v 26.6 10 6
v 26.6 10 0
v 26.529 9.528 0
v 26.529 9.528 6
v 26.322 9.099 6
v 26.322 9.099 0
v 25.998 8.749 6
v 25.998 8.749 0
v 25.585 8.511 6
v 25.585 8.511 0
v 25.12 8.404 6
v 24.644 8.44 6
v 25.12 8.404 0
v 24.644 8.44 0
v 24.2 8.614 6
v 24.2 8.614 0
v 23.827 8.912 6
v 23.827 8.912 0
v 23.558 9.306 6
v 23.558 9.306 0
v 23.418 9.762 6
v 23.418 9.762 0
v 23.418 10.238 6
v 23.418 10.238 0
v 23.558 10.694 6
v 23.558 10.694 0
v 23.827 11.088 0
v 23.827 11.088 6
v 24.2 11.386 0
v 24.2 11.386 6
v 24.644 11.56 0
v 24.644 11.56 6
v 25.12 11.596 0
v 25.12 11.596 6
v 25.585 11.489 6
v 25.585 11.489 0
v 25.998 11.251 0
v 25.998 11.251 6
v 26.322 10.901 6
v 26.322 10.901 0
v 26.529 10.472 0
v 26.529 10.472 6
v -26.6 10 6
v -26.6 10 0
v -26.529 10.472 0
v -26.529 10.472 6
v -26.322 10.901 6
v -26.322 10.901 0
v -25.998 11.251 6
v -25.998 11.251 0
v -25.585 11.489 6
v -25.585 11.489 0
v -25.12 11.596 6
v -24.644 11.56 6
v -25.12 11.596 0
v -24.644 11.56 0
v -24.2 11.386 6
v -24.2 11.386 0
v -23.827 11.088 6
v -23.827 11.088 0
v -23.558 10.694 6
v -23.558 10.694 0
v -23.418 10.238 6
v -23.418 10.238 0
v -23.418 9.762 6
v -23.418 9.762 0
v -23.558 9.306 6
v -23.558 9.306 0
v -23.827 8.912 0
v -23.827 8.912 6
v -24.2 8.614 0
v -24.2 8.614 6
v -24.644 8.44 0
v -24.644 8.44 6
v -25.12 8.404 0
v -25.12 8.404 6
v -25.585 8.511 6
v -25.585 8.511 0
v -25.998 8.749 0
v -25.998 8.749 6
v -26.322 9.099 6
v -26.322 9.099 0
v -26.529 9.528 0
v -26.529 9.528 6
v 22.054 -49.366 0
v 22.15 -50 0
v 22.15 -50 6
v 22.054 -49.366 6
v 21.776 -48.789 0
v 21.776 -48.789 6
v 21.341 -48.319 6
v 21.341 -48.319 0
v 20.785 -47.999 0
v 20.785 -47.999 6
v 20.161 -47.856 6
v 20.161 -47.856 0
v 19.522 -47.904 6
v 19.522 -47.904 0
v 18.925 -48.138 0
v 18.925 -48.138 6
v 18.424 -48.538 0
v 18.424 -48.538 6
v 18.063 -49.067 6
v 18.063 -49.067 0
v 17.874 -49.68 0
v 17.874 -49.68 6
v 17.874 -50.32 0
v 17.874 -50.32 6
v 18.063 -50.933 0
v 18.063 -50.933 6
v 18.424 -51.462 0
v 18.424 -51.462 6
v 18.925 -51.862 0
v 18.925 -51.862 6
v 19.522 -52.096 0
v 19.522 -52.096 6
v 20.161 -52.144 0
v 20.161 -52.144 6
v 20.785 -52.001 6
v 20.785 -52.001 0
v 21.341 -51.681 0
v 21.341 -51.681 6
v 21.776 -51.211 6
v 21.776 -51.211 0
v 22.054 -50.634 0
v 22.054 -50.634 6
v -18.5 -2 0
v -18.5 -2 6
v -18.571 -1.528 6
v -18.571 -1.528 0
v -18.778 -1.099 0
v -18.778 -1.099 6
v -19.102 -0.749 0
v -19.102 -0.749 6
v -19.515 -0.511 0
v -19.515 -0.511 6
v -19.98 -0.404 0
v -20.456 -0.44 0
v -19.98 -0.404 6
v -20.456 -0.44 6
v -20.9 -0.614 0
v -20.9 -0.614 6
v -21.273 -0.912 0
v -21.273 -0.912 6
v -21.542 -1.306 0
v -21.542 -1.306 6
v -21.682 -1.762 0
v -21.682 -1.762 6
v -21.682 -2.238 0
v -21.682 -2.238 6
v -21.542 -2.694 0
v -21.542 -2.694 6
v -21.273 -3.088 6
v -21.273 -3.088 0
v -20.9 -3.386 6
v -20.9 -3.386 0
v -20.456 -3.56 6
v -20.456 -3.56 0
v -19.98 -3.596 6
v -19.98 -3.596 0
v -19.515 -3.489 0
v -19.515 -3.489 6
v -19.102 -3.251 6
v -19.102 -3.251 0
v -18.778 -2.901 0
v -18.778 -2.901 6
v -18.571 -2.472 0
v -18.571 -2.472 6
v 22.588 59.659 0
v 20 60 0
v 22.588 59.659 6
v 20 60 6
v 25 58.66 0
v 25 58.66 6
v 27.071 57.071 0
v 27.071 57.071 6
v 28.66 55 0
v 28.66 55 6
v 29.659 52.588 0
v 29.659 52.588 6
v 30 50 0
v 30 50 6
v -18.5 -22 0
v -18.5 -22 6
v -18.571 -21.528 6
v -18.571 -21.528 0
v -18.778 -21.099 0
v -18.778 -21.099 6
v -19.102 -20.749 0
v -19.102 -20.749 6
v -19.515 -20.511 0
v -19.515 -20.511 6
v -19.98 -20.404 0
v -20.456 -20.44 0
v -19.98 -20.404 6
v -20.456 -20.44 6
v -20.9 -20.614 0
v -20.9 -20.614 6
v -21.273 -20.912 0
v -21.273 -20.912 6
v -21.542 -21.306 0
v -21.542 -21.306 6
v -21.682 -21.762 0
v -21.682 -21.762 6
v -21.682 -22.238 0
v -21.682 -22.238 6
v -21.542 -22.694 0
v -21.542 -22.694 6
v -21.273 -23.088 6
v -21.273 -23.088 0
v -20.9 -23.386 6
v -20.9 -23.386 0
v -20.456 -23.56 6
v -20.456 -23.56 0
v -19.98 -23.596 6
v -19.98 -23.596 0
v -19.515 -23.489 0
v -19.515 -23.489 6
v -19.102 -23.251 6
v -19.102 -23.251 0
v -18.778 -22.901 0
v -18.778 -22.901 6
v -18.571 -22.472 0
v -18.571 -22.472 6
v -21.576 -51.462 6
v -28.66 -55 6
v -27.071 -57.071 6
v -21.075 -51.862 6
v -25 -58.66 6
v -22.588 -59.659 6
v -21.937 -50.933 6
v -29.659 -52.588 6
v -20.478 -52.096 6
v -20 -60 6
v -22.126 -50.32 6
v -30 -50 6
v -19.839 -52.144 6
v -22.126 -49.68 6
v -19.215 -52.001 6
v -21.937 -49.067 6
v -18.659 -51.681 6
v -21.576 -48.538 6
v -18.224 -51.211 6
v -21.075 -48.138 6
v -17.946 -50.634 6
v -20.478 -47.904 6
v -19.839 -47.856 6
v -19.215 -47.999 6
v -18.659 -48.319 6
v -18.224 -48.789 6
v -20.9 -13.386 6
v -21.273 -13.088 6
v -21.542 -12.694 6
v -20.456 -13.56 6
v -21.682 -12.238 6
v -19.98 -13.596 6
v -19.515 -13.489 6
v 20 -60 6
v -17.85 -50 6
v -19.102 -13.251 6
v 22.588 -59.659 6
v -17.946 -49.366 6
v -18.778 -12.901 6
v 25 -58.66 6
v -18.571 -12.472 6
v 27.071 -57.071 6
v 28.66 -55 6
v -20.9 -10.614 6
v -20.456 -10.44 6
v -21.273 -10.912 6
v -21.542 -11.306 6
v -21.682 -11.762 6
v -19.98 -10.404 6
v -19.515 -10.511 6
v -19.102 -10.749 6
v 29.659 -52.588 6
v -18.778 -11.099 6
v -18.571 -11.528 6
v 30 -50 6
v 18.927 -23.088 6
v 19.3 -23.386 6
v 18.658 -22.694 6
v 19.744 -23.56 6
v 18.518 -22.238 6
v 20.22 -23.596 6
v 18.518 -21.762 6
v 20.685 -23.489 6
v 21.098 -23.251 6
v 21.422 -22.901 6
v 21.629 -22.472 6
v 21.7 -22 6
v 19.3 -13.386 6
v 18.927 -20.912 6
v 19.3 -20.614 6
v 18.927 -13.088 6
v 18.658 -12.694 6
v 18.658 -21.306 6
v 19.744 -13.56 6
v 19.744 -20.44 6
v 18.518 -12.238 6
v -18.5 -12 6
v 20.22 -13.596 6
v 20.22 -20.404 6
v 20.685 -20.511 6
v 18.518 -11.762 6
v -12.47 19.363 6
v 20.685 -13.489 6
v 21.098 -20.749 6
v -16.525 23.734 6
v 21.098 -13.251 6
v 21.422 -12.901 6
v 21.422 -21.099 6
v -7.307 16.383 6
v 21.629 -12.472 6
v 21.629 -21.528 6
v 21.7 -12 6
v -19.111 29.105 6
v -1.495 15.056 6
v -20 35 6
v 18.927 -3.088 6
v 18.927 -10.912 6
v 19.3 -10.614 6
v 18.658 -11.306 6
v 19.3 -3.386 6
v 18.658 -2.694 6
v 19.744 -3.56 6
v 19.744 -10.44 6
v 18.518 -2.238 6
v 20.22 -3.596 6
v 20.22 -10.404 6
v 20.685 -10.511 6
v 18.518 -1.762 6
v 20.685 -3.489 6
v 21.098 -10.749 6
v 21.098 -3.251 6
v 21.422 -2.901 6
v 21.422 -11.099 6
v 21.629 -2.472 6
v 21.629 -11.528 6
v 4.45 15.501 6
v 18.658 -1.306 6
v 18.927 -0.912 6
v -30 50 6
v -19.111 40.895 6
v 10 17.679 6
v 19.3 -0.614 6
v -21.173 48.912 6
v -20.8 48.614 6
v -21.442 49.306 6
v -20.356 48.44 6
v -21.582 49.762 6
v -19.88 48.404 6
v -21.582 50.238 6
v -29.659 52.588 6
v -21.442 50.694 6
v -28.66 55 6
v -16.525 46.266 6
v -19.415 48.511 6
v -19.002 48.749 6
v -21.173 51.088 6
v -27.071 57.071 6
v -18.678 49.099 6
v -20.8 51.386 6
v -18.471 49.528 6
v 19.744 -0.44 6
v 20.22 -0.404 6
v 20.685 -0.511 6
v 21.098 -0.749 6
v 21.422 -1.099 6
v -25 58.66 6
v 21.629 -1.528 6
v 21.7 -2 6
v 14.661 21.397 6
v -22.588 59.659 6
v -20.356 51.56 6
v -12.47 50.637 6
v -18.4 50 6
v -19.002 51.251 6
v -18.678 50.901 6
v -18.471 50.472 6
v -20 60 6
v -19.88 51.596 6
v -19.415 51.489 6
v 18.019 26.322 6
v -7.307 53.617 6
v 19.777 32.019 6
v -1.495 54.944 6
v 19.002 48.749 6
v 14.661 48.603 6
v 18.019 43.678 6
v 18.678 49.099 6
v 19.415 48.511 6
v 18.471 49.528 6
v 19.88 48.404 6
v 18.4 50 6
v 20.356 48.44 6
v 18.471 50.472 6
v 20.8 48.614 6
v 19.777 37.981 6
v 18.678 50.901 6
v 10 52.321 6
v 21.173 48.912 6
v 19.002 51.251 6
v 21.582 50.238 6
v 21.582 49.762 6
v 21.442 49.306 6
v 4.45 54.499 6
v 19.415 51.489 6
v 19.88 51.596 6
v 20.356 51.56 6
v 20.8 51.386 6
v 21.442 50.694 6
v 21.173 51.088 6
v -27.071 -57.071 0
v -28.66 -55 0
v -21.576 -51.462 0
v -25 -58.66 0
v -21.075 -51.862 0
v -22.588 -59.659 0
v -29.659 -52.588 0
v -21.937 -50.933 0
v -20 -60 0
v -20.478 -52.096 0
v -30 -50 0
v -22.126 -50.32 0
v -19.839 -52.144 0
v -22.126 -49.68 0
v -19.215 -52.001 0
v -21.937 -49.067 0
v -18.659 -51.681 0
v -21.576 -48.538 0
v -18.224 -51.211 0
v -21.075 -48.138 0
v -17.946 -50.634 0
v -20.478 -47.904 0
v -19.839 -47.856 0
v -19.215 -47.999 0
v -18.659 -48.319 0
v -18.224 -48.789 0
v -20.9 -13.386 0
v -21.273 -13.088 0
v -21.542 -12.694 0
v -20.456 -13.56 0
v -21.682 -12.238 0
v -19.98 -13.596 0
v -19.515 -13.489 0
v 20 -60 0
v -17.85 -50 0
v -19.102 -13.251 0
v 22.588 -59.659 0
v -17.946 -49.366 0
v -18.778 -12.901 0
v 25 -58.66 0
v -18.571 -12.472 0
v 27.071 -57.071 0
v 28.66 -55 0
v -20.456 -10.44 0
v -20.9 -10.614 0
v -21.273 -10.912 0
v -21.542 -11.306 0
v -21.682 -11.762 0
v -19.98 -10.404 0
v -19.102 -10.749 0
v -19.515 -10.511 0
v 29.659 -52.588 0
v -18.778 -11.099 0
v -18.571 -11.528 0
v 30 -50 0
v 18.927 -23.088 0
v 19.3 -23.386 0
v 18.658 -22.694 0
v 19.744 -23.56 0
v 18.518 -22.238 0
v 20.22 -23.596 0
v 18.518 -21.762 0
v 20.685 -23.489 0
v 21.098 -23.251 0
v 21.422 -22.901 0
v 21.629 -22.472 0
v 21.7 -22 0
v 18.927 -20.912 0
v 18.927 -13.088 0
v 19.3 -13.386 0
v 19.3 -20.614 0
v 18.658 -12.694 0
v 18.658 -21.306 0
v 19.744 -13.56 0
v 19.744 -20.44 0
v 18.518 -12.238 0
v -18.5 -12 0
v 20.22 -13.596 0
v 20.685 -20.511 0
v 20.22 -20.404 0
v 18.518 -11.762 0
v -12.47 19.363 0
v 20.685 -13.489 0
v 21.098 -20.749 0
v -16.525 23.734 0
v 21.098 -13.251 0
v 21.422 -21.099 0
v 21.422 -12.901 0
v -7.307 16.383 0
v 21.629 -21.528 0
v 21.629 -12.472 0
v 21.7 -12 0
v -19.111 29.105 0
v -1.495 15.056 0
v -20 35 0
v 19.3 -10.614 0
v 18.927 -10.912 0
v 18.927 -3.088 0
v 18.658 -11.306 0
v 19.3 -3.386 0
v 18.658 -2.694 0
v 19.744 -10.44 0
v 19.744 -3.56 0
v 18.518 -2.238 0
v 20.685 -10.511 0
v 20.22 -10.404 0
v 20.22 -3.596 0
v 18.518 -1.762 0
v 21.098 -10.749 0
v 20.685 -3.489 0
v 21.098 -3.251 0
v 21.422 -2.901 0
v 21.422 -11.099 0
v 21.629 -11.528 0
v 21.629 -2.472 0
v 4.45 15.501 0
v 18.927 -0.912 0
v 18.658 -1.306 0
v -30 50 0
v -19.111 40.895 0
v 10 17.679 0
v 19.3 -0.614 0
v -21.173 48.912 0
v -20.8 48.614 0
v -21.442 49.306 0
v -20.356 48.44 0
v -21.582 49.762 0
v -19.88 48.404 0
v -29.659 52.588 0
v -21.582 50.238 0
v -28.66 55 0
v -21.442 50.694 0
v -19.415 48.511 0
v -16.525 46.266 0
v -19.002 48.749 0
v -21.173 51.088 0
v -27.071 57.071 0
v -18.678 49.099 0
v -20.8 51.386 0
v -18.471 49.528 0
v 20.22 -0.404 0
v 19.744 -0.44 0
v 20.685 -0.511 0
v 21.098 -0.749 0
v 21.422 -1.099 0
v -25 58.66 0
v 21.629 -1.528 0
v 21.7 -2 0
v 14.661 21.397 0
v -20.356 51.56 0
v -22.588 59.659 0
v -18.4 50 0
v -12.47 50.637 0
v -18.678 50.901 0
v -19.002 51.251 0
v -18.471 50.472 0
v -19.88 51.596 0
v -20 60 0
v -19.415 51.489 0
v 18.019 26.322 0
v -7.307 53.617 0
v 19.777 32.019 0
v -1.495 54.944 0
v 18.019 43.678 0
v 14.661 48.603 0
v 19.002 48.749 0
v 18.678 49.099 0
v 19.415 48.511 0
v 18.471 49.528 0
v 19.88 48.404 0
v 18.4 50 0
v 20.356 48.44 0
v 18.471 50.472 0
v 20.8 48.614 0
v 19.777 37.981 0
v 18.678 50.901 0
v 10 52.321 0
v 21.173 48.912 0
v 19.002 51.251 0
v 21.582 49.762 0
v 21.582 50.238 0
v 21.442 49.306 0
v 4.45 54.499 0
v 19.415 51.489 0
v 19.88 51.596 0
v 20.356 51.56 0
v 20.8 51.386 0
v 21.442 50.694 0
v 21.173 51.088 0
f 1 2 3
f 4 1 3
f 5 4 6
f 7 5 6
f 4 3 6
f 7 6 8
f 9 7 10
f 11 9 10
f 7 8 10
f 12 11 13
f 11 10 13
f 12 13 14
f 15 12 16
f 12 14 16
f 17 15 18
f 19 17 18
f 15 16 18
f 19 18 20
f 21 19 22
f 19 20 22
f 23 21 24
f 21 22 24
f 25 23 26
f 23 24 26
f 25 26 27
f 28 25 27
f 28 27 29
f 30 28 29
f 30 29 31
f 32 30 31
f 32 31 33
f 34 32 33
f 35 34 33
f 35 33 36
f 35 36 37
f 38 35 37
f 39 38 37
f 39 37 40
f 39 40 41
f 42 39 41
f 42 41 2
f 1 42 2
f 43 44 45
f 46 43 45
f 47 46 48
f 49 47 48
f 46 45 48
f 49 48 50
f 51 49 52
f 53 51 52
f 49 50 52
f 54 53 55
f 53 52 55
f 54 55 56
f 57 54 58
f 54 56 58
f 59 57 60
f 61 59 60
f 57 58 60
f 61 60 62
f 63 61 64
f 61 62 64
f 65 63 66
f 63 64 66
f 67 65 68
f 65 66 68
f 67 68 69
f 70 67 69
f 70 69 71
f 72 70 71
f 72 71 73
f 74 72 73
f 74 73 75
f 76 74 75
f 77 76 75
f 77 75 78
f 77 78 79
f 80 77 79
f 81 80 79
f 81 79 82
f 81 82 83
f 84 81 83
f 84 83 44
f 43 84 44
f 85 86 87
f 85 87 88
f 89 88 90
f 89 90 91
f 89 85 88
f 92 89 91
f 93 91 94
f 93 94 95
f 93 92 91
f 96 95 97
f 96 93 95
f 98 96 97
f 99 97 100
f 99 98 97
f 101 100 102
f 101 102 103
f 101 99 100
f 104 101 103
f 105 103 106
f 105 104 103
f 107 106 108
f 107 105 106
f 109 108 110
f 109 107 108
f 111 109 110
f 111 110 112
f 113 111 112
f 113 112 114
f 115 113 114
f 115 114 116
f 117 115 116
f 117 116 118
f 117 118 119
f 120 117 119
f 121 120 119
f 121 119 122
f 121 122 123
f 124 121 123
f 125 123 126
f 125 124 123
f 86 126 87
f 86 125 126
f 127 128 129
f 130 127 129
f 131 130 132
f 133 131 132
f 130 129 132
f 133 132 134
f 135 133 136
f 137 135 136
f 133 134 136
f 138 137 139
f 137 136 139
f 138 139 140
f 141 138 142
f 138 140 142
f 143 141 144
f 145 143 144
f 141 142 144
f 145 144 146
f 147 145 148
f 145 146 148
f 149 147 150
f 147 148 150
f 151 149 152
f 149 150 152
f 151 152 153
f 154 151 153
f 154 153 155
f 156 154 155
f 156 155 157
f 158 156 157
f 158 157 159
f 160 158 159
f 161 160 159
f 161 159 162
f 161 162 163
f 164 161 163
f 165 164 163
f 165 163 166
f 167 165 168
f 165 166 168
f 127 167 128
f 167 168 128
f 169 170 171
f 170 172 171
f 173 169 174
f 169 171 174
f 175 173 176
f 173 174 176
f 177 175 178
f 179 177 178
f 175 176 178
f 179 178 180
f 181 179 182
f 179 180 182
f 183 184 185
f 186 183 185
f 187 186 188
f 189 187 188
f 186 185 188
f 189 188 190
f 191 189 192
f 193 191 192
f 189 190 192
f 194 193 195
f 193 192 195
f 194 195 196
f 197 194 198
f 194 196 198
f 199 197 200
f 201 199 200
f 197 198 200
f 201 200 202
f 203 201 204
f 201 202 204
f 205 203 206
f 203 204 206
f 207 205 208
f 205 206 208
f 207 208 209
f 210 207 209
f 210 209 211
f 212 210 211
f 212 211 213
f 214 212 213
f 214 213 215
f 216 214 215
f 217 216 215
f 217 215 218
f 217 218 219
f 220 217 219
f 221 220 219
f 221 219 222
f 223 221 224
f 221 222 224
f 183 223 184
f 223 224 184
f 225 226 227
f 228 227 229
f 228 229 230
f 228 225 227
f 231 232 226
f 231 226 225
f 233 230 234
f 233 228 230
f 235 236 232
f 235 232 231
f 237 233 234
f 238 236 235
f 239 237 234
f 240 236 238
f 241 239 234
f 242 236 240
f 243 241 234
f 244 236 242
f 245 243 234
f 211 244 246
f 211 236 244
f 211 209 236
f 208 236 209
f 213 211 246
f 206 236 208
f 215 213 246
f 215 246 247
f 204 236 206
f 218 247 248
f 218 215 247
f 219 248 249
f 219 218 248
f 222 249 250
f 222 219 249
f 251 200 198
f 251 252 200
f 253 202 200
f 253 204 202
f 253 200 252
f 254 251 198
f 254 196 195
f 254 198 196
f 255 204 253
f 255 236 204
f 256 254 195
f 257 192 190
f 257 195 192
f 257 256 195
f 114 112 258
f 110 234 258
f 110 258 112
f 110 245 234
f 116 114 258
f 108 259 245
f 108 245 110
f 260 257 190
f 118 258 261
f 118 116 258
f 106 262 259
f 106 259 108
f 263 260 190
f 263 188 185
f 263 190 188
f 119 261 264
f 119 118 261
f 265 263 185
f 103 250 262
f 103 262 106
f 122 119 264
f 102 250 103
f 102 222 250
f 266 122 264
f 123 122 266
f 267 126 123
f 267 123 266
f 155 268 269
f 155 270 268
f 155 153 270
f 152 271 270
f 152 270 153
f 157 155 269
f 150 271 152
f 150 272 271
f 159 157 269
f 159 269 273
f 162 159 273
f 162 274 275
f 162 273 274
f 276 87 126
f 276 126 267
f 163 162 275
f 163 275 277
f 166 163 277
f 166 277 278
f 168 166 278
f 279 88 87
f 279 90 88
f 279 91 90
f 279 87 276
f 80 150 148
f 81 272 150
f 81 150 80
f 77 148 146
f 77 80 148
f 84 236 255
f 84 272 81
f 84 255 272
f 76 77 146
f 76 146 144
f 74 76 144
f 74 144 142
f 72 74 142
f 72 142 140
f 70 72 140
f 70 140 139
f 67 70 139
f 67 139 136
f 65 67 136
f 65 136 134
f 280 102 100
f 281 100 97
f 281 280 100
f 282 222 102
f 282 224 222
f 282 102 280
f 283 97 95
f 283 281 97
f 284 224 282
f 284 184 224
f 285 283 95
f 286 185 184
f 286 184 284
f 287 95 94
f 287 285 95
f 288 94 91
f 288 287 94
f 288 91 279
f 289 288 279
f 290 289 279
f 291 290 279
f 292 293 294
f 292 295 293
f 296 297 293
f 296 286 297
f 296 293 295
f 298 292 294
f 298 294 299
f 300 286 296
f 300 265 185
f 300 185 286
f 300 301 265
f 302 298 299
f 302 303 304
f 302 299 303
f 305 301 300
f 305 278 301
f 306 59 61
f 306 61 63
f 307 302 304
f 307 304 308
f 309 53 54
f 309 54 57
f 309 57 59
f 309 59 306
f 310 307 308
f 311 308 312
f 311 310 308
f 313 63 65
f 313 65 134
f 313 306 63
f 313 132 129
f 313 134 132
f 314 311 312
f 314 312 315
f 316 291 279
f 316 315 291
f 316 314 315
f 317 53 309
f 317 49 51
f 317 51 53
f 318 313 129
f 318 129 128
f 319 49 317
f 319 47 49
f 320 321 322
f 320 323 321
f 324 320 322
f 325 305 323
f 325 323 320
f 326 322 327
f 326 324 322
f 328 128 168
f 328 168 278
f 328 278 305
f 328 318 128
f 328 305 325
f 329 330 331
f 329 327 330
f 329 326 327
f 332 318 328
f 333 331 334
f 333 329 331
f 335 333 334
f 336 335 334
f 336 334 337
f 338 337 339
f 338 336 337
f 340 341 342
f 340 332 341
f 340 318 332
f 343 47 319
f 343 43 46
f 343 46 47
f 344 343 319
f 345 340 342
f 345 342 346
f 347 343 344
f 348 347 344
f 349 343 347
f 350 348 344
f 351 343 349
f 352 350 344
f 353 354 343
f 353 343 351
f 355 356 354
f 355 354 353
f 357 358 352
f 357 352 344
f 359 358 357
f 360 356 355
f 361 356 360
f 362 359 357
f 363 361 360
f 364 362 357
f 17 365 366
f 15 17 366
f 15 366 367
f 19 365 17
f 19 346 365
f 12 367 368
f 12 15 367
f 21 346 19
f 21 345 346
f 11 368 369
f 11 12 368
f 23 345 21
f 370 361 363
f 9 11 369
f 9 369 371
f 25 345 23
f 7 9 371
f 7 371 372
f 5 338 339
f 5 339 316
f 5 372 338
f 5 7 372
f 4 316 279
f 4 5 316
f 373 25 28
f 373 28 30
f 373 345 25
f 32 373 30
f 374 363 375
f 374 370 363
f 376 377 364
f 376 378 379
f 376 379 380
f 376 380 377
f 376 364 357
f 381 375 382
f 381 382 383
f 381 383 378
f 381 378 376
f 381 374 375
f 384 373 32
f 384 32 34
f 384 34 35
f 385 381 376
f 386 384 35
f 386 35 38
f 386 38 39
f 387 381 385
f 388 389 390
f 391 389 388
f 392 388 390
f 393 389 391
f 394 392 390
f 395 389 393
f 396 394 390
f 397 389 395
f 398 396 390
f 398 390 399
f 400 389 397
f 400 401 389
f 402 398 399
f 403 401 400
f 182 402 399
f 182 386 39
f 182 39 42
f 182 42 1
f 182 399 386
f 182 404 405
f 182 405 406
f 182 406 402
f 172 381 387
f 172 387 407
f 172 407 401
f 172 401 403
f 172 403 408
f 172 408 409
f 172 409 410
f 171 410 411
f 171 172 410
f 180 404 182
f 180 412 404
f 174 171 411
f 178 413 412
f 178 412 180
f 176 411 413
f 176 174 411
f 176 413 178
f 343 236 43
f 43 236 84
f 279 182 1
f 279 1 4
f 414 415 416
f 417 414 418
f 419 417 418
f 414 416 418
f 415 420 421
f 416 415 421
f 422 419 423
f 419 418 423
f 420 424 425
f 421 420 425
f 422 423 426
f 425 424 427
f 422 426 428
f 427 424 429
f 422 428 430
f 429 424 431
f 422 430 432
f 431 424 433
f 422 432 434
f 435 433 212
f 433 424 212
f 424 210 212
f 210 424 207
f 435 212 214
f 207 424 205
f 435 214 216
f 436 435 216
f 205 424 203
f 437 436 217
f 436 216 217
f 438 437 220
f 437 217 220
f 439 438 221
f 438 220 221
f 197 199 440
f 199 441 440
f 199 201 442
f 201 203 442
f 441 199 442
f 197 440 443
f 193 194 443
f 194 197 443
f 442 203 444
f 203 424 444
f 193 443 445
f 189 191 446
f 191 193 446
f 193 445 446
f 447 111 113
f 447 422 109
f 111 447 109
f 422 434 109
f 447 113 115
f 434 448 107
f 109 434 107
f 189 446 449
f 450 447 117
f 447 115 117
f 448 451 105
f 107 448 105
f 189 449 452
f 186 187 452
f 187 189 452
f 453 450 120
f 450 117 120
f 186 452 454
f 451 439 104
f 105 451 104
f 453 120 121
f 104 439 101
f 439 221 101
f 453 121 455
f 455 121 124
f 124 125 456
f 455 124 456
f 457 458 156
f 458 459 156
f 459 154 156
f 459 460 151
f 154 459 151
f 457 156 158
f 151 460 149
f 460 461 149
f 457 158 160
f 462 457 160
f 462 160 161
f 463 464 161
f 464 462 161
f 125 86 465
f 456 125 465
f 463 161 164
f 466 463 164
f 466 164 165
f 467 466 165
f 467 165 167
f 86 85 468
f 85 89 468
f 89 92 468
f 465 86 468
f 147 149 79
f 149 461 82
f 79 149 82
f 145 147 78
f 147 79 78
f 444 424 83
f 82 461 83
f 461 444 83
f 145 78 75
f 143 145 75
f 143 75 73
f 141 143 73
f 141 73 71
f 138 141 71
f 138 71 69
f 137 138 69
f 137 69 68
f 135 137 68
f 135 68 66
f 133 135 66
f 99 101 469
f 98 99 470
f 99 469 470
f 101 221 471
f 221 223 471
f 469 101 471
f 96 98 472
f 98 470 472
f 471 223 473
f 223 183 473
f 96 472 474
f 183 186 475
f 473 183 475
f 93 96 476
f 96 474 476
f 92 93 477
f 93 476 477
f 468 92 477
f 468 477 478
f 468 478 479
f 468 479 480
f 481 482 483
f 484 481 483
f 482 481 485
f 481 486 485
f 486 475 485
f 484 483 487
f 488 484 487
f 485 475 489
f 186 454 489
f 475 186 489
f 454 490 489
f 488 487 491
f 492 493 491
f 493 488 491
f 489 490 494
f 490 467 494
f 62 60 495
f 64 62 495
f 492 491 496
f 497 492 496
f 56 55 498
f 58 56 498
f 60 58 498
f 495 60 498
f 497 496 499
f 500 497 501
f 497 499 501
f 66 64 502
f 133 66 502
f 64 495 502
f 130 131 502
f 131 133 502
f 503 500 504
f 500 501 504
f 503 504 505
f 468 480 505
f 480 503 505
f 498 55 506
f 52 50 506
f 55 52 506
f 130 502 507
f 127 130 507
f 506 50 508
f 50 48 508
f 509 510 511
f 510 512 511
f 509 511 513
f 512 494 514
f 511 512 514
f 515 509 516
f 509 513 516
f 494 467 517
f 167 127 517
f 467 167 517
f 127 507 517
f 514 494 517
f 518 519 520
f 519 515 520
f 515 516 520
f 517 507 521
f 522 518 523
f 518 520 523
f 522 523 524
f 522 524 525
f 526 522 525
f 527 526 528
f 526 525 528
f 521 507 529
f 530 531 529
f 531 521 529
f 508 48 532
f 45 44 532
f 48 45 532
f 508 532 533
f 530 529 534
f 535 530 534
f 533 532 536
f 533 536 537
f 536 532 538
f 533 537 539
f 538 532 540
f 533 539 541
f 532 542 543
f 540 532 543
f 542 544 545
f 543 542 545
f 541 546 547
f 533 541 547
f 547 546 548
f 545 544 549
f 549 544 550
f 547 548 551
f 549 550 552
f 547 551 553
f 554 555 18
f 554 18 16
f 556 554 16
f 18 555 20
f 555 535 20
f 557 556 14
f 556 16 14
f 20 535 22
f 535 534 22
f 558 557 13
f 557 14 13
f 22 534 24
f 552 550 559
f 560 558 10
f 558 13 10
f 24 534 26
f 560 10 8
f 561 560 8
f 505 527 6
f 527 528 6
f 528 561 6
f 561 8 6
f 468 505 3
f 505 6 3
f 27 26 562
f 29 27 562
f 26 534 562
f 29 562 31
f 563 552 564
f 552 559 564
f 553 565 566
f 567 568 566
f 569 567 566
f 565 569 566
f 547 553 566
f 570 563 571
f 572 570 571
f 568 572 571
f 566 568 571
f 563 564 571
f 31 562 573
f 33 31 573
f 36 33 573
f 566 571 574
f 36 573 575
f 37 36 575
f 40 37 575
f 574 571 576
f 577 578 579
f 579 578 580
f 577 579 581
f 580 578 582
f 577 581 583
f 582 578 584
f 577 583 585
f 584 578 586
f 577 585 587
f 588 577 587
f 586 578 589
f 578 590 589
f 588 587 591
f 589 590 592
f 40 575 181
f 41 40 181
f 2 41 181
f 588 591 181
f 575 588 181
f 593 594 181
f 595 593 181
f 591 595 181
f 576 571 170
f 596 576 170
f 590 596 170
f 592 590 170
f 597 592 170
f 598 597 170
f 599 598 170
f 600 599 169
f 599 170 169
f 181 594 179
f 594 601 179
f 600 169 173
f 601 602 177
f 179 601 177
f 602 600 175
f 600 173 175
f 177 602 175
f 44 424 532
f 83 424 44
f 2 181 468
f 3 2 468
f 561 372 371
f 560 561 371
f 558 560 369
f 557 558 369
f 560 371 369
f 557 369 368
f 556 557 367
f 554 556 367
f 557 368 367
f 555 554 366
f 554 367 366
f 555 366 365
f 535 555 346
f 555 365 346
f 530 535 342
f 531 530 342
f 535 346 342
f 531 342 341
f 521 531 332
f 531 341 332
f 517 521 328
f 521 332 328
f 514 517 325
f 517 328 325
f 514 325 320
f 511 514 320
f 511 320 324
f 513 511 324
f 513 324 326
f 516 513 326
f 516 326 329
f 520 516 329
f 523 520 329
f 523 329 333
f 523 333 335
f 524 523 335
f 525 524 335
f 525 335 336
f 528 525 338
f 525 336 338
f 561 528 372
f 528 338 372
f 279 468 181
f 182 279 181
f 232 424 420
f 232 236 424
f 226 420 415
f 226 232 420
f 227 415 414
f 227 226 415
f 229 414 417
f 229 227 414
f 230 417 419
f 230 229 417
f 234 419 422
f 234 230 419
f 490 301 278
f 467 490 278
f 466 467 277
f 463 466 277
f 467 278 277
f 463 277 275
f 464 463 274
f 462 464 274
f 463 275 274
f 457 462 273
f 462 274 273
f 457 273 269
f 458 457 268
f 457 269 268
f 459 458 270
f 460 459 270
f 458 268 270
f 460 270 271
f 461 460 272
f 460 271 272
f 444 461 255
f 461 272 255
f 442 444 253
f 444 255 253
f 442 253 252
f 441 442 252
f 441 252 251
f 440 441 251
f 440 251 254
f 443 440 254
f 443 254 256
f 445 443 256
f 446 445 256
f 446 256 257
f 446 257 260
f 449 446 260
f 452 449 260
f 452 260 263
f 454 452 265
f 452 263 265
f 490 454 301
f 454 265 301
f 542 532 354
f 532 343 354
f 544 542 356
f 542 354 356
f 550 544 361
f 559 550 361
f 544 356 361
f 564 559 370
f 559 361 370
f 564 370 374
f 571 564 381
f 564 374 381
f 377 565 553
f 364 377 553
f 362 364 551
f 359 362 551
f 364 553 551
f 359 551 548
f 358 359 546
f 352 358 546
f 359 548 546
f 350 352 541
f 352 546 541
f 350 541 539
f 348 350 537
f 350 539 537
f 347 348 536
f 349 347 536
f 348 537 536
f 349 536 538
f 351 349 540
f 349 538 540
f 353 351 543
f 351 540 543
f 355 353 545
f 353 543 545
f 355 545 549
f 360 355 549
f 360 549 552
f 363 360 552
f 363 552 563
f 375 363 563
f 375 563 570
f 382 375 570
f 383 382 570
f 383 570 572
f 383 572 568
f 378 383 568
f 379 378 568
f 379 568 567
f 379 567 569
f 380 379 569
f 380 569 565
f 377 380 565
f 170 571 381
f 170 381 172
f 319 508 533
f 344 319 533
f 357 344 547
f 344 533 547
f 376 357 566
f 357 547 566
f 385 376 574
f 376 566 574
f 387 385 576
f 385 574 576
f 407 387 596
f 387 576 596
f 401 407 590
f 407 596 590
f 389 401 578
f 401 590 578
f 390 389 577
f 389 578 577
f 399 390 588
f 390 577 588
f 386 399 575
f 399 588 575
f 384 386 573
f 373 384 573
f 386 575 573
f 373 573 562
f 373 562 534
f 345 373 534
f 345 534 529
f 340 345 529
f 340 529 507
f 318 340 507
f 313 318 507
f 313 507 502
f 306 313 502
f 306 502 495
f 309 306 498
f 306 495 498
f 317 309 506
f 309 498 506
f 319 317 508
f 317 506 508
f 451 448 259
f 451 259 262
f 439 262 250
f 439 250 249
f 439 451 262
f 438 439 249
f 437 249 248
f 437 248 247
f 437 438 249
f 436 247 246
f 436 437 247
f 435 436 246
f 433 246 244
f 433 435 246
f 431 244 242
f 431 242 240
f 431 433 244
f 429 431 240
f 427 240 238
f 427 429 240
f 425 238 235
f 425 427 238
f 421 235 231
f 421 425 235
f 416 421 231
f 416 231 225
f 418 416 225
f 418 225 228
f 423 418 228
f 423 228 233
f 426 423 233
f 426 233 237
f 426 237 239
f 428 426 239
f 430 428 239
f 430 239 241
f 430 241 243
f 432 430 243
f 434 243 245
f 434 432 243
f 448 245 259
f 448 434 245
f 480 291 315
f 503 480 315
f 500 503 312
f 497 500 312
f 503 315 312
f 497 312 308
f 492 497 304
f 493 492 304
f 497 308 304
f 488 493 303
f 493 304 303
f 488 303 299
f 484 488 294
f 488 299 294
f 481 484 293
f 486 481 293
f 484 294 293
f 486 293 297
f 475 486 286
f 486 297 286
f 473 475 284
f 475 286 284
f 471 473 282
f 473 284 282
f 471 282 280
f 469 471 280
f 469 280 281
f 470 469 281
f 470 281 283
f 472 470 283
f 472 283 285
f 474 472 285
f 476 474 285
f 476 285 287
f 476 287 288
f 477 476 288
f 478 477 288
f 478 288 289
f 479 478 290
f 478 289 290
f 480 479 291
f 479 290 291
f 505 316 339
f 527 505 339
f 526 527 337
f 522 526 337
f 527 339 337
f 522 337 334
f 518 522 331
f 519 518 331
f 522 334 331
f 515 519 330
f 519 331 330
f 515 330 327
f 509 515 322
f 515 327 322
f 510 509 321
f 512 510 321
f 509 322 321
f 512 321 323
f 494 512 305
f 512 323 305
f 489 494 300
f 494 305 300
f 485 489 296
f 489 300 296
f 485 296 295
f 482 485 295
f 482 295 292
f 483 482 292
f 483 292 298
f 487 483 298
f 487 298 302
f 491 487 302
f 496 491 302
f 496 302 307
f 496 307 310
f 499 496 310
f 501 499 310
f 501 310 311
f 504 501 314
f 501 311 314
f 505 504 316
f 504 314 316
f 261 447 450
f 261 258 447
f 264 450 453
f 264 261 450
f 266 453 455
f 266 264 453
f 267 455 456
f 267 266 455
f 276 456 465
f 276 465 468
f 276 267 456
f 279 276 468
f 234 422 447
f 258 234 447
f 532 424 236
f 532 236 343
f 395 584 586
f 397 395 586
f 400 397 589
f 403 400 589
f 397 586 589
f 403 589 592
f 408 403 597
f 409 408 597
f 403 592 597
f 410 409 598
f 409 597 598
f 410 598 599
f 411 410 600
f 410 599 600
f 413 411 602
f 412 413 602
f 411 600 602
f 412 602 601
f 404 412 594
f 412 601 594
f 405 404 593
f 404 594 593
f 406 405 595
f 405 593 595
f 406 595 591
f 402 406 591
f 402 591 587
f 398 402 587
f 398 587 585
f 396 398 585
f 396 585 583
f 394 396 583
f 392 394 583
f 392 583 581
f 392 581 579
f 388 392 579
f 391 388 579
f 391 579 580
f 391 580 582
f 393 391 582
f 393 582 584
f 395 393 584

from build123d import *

# Parameters (mm, degrees)
SKETCH_1_W          = 60
SKETCH_1_H          = 120
SKETCH_1_R          = 1.6
SKETCH_1_R_2        = 2.15
EXTRUDE_3_DEPTH     = 6
SKETCH_9_R          = 1.6
CUT_EXTRUDE_1_DEPTH = 6
FILLET_1_R          = 10
SKETCH_11_R         = 20
SKETCH_11_R_2       = 1.6
CUT_EXTRUDE_2_DEPTH = 6
SKETCH_21_R         = 1.6
CUT_EXTRUDE_7_DEPTH = 10


with BuildPart() as part:
    # 草图1 → 凸台-拉伸3 (new body)
    with BuildSketch(Plane.XY):
        Rectangle(SKETCH_1_W, SKETCH_1_H)
        with Locations((0, 50.5)):
            Circle(SKETCH_1_R, mode=Mode.SUBTRACT)
        with Locations((20, -50)):
            Circle(SKETCH_1_R_2, mode=Mode.SUBTRACT)
        with Locations((-20, -50)):
            Circle(SKETCH_1_R_2, mode=Mode.SUBTRACT)
        with Locations((13.423393759, 42.75)):
            Circle(SKETCH_1_R, mode=Mode.SUBTRACT)
        with Locations((13.423393759, 27.25)):
            Circle(SKETCH_1_R, mode=Mode.SUBTRACT)
        with Locations((0, 19.5)):
            Circle(SKETCH_1_R, mode=Mode.SUBTRACT)
        with Locations((-13.423393759, 27.25)):
            Circle(SKETCH_1_R, mode=Mode.SUBTRACT)
        with Locations((-13.423393759, 42.75)):
            Circle(SKETCH_1_R, mode=Mode.SUBTRACT)
        with BuildLine():
            Line((6, 42), (6, 28))
            ThreePointArc((6, 28), (0, 22), (-6, 28))
            Line((-6, 28), (-6, 42))
            ThreePointArc((-6, 42), (0, 48), (6, 42))
        make_face(mode=Mode.SUBTRACT)
    extrude(amount=EXTRUDE_3_DEPTH)

    # 草图9 → 切除-拉伸1 (cut)
    with BuildSketch(Plane.XY.offset(6)):
        with Locations((20.1, -22)):
            Circle(SKETCH_9_R)
        with Locations((20.1, -2)):
            Circle(SKETCH_9_R)
        with Locations((20.1, -12)):
            Circle(SKETCH_9_R)
        with Locations((-20.1, -2)):
            Circle(SKETCH_9_R)
        with Locations((-20.1, -12)):
            Circle(SKETCH_9_R)
        with Locations((-20.1, -22)):
            Circle(SKETCH_9_R)
    extrude(amount=-CUT_EXTRUDE_1_DEPTH, mode=Mode.SUBTRACT)

    # 圆角1
    fillet_1_edges = [part.edges().sort_by_distance(p)[0] for p in [
        (30, -60, 3),
        (-30, -60, 3),
        (-30, 60, 3),
        (30, 60, 3),
    ]]
    fillet(fillet_1_edges, radius=FILLET_1_R)

    # 草图11 → 切除-拉伸2 (cut)
    with BuildSketch(Plane(origin=(0, 0, 0), x_dir=(-1, 0, 0), z_dir=(0, 0, -1))):
        with Locations((0, 35)):
            Circle(SKETCH_11_R)
        with Locations((-13.423393759, 27.25)):
            Circle(SKETCH_11_R_2, mode=Mode.SUBTRACT)
        with Locations((13.423393759, 27.25)):
            Circle(SKETCH_11_R_2, mode=Mode.SUBTRACT)
        with Locations((13.423393759, 42.75)):
            Circle(SKETCH_11_R_2, mode=Mode.SUBTRACT)
        with Locations((0, 19.5)):
            Circle(SKETCH_11_R_2, mode=Mode.SUBTRACT)
        with Locations((0, 50.5)):
            Circle(SKETCH_11_R_2, mode=Mode.SUBTRACT)
        with Locations((-13.423393759, 42.75)):
            Circle(SKETCH_11_R_2, mode=Mode.SUBTRACT)
        with BuildLine():
            ThreePointArc((-6, 42), (0, 48), (6, 42))
            Line((6, 42), (6, 28))
            ThreePointArc((6, 28), (0, 22), (-6, 28))
            Line((-6, 28), (-6, 42))
        make_face(mode=Mode.SUBTRACT)
    extrude(amount=-CUT_EXTRUDE_2_DEPTH, mode=Mode.SUBTRACT)

    # 草图21 → 切除-拉伸7 (cut)
    with BuildSketch(Plane(origin=(0, 0, 0), x_dir=(-1, 0, 0), z_dir=(0, 0, -1))):
        with Locations((-20, 50)):
            Circle(SKETCH_21_R)
        with Locations(Location((20, 50, 0), (0, 0, 180))):
            Circle(SKETCH_21_R)
        with Locations((25, 10)):
            Circle(SKETCH_21_R)
        with Locations(Location((-25, 10, 0), (0, 0, 180))):
            Circle(SKETCH_21_R)
    extrude(amount=-CUT_EXTRUDE_7_DEPTH, mode=Mode.SUBTRACT)


solid = part.part
